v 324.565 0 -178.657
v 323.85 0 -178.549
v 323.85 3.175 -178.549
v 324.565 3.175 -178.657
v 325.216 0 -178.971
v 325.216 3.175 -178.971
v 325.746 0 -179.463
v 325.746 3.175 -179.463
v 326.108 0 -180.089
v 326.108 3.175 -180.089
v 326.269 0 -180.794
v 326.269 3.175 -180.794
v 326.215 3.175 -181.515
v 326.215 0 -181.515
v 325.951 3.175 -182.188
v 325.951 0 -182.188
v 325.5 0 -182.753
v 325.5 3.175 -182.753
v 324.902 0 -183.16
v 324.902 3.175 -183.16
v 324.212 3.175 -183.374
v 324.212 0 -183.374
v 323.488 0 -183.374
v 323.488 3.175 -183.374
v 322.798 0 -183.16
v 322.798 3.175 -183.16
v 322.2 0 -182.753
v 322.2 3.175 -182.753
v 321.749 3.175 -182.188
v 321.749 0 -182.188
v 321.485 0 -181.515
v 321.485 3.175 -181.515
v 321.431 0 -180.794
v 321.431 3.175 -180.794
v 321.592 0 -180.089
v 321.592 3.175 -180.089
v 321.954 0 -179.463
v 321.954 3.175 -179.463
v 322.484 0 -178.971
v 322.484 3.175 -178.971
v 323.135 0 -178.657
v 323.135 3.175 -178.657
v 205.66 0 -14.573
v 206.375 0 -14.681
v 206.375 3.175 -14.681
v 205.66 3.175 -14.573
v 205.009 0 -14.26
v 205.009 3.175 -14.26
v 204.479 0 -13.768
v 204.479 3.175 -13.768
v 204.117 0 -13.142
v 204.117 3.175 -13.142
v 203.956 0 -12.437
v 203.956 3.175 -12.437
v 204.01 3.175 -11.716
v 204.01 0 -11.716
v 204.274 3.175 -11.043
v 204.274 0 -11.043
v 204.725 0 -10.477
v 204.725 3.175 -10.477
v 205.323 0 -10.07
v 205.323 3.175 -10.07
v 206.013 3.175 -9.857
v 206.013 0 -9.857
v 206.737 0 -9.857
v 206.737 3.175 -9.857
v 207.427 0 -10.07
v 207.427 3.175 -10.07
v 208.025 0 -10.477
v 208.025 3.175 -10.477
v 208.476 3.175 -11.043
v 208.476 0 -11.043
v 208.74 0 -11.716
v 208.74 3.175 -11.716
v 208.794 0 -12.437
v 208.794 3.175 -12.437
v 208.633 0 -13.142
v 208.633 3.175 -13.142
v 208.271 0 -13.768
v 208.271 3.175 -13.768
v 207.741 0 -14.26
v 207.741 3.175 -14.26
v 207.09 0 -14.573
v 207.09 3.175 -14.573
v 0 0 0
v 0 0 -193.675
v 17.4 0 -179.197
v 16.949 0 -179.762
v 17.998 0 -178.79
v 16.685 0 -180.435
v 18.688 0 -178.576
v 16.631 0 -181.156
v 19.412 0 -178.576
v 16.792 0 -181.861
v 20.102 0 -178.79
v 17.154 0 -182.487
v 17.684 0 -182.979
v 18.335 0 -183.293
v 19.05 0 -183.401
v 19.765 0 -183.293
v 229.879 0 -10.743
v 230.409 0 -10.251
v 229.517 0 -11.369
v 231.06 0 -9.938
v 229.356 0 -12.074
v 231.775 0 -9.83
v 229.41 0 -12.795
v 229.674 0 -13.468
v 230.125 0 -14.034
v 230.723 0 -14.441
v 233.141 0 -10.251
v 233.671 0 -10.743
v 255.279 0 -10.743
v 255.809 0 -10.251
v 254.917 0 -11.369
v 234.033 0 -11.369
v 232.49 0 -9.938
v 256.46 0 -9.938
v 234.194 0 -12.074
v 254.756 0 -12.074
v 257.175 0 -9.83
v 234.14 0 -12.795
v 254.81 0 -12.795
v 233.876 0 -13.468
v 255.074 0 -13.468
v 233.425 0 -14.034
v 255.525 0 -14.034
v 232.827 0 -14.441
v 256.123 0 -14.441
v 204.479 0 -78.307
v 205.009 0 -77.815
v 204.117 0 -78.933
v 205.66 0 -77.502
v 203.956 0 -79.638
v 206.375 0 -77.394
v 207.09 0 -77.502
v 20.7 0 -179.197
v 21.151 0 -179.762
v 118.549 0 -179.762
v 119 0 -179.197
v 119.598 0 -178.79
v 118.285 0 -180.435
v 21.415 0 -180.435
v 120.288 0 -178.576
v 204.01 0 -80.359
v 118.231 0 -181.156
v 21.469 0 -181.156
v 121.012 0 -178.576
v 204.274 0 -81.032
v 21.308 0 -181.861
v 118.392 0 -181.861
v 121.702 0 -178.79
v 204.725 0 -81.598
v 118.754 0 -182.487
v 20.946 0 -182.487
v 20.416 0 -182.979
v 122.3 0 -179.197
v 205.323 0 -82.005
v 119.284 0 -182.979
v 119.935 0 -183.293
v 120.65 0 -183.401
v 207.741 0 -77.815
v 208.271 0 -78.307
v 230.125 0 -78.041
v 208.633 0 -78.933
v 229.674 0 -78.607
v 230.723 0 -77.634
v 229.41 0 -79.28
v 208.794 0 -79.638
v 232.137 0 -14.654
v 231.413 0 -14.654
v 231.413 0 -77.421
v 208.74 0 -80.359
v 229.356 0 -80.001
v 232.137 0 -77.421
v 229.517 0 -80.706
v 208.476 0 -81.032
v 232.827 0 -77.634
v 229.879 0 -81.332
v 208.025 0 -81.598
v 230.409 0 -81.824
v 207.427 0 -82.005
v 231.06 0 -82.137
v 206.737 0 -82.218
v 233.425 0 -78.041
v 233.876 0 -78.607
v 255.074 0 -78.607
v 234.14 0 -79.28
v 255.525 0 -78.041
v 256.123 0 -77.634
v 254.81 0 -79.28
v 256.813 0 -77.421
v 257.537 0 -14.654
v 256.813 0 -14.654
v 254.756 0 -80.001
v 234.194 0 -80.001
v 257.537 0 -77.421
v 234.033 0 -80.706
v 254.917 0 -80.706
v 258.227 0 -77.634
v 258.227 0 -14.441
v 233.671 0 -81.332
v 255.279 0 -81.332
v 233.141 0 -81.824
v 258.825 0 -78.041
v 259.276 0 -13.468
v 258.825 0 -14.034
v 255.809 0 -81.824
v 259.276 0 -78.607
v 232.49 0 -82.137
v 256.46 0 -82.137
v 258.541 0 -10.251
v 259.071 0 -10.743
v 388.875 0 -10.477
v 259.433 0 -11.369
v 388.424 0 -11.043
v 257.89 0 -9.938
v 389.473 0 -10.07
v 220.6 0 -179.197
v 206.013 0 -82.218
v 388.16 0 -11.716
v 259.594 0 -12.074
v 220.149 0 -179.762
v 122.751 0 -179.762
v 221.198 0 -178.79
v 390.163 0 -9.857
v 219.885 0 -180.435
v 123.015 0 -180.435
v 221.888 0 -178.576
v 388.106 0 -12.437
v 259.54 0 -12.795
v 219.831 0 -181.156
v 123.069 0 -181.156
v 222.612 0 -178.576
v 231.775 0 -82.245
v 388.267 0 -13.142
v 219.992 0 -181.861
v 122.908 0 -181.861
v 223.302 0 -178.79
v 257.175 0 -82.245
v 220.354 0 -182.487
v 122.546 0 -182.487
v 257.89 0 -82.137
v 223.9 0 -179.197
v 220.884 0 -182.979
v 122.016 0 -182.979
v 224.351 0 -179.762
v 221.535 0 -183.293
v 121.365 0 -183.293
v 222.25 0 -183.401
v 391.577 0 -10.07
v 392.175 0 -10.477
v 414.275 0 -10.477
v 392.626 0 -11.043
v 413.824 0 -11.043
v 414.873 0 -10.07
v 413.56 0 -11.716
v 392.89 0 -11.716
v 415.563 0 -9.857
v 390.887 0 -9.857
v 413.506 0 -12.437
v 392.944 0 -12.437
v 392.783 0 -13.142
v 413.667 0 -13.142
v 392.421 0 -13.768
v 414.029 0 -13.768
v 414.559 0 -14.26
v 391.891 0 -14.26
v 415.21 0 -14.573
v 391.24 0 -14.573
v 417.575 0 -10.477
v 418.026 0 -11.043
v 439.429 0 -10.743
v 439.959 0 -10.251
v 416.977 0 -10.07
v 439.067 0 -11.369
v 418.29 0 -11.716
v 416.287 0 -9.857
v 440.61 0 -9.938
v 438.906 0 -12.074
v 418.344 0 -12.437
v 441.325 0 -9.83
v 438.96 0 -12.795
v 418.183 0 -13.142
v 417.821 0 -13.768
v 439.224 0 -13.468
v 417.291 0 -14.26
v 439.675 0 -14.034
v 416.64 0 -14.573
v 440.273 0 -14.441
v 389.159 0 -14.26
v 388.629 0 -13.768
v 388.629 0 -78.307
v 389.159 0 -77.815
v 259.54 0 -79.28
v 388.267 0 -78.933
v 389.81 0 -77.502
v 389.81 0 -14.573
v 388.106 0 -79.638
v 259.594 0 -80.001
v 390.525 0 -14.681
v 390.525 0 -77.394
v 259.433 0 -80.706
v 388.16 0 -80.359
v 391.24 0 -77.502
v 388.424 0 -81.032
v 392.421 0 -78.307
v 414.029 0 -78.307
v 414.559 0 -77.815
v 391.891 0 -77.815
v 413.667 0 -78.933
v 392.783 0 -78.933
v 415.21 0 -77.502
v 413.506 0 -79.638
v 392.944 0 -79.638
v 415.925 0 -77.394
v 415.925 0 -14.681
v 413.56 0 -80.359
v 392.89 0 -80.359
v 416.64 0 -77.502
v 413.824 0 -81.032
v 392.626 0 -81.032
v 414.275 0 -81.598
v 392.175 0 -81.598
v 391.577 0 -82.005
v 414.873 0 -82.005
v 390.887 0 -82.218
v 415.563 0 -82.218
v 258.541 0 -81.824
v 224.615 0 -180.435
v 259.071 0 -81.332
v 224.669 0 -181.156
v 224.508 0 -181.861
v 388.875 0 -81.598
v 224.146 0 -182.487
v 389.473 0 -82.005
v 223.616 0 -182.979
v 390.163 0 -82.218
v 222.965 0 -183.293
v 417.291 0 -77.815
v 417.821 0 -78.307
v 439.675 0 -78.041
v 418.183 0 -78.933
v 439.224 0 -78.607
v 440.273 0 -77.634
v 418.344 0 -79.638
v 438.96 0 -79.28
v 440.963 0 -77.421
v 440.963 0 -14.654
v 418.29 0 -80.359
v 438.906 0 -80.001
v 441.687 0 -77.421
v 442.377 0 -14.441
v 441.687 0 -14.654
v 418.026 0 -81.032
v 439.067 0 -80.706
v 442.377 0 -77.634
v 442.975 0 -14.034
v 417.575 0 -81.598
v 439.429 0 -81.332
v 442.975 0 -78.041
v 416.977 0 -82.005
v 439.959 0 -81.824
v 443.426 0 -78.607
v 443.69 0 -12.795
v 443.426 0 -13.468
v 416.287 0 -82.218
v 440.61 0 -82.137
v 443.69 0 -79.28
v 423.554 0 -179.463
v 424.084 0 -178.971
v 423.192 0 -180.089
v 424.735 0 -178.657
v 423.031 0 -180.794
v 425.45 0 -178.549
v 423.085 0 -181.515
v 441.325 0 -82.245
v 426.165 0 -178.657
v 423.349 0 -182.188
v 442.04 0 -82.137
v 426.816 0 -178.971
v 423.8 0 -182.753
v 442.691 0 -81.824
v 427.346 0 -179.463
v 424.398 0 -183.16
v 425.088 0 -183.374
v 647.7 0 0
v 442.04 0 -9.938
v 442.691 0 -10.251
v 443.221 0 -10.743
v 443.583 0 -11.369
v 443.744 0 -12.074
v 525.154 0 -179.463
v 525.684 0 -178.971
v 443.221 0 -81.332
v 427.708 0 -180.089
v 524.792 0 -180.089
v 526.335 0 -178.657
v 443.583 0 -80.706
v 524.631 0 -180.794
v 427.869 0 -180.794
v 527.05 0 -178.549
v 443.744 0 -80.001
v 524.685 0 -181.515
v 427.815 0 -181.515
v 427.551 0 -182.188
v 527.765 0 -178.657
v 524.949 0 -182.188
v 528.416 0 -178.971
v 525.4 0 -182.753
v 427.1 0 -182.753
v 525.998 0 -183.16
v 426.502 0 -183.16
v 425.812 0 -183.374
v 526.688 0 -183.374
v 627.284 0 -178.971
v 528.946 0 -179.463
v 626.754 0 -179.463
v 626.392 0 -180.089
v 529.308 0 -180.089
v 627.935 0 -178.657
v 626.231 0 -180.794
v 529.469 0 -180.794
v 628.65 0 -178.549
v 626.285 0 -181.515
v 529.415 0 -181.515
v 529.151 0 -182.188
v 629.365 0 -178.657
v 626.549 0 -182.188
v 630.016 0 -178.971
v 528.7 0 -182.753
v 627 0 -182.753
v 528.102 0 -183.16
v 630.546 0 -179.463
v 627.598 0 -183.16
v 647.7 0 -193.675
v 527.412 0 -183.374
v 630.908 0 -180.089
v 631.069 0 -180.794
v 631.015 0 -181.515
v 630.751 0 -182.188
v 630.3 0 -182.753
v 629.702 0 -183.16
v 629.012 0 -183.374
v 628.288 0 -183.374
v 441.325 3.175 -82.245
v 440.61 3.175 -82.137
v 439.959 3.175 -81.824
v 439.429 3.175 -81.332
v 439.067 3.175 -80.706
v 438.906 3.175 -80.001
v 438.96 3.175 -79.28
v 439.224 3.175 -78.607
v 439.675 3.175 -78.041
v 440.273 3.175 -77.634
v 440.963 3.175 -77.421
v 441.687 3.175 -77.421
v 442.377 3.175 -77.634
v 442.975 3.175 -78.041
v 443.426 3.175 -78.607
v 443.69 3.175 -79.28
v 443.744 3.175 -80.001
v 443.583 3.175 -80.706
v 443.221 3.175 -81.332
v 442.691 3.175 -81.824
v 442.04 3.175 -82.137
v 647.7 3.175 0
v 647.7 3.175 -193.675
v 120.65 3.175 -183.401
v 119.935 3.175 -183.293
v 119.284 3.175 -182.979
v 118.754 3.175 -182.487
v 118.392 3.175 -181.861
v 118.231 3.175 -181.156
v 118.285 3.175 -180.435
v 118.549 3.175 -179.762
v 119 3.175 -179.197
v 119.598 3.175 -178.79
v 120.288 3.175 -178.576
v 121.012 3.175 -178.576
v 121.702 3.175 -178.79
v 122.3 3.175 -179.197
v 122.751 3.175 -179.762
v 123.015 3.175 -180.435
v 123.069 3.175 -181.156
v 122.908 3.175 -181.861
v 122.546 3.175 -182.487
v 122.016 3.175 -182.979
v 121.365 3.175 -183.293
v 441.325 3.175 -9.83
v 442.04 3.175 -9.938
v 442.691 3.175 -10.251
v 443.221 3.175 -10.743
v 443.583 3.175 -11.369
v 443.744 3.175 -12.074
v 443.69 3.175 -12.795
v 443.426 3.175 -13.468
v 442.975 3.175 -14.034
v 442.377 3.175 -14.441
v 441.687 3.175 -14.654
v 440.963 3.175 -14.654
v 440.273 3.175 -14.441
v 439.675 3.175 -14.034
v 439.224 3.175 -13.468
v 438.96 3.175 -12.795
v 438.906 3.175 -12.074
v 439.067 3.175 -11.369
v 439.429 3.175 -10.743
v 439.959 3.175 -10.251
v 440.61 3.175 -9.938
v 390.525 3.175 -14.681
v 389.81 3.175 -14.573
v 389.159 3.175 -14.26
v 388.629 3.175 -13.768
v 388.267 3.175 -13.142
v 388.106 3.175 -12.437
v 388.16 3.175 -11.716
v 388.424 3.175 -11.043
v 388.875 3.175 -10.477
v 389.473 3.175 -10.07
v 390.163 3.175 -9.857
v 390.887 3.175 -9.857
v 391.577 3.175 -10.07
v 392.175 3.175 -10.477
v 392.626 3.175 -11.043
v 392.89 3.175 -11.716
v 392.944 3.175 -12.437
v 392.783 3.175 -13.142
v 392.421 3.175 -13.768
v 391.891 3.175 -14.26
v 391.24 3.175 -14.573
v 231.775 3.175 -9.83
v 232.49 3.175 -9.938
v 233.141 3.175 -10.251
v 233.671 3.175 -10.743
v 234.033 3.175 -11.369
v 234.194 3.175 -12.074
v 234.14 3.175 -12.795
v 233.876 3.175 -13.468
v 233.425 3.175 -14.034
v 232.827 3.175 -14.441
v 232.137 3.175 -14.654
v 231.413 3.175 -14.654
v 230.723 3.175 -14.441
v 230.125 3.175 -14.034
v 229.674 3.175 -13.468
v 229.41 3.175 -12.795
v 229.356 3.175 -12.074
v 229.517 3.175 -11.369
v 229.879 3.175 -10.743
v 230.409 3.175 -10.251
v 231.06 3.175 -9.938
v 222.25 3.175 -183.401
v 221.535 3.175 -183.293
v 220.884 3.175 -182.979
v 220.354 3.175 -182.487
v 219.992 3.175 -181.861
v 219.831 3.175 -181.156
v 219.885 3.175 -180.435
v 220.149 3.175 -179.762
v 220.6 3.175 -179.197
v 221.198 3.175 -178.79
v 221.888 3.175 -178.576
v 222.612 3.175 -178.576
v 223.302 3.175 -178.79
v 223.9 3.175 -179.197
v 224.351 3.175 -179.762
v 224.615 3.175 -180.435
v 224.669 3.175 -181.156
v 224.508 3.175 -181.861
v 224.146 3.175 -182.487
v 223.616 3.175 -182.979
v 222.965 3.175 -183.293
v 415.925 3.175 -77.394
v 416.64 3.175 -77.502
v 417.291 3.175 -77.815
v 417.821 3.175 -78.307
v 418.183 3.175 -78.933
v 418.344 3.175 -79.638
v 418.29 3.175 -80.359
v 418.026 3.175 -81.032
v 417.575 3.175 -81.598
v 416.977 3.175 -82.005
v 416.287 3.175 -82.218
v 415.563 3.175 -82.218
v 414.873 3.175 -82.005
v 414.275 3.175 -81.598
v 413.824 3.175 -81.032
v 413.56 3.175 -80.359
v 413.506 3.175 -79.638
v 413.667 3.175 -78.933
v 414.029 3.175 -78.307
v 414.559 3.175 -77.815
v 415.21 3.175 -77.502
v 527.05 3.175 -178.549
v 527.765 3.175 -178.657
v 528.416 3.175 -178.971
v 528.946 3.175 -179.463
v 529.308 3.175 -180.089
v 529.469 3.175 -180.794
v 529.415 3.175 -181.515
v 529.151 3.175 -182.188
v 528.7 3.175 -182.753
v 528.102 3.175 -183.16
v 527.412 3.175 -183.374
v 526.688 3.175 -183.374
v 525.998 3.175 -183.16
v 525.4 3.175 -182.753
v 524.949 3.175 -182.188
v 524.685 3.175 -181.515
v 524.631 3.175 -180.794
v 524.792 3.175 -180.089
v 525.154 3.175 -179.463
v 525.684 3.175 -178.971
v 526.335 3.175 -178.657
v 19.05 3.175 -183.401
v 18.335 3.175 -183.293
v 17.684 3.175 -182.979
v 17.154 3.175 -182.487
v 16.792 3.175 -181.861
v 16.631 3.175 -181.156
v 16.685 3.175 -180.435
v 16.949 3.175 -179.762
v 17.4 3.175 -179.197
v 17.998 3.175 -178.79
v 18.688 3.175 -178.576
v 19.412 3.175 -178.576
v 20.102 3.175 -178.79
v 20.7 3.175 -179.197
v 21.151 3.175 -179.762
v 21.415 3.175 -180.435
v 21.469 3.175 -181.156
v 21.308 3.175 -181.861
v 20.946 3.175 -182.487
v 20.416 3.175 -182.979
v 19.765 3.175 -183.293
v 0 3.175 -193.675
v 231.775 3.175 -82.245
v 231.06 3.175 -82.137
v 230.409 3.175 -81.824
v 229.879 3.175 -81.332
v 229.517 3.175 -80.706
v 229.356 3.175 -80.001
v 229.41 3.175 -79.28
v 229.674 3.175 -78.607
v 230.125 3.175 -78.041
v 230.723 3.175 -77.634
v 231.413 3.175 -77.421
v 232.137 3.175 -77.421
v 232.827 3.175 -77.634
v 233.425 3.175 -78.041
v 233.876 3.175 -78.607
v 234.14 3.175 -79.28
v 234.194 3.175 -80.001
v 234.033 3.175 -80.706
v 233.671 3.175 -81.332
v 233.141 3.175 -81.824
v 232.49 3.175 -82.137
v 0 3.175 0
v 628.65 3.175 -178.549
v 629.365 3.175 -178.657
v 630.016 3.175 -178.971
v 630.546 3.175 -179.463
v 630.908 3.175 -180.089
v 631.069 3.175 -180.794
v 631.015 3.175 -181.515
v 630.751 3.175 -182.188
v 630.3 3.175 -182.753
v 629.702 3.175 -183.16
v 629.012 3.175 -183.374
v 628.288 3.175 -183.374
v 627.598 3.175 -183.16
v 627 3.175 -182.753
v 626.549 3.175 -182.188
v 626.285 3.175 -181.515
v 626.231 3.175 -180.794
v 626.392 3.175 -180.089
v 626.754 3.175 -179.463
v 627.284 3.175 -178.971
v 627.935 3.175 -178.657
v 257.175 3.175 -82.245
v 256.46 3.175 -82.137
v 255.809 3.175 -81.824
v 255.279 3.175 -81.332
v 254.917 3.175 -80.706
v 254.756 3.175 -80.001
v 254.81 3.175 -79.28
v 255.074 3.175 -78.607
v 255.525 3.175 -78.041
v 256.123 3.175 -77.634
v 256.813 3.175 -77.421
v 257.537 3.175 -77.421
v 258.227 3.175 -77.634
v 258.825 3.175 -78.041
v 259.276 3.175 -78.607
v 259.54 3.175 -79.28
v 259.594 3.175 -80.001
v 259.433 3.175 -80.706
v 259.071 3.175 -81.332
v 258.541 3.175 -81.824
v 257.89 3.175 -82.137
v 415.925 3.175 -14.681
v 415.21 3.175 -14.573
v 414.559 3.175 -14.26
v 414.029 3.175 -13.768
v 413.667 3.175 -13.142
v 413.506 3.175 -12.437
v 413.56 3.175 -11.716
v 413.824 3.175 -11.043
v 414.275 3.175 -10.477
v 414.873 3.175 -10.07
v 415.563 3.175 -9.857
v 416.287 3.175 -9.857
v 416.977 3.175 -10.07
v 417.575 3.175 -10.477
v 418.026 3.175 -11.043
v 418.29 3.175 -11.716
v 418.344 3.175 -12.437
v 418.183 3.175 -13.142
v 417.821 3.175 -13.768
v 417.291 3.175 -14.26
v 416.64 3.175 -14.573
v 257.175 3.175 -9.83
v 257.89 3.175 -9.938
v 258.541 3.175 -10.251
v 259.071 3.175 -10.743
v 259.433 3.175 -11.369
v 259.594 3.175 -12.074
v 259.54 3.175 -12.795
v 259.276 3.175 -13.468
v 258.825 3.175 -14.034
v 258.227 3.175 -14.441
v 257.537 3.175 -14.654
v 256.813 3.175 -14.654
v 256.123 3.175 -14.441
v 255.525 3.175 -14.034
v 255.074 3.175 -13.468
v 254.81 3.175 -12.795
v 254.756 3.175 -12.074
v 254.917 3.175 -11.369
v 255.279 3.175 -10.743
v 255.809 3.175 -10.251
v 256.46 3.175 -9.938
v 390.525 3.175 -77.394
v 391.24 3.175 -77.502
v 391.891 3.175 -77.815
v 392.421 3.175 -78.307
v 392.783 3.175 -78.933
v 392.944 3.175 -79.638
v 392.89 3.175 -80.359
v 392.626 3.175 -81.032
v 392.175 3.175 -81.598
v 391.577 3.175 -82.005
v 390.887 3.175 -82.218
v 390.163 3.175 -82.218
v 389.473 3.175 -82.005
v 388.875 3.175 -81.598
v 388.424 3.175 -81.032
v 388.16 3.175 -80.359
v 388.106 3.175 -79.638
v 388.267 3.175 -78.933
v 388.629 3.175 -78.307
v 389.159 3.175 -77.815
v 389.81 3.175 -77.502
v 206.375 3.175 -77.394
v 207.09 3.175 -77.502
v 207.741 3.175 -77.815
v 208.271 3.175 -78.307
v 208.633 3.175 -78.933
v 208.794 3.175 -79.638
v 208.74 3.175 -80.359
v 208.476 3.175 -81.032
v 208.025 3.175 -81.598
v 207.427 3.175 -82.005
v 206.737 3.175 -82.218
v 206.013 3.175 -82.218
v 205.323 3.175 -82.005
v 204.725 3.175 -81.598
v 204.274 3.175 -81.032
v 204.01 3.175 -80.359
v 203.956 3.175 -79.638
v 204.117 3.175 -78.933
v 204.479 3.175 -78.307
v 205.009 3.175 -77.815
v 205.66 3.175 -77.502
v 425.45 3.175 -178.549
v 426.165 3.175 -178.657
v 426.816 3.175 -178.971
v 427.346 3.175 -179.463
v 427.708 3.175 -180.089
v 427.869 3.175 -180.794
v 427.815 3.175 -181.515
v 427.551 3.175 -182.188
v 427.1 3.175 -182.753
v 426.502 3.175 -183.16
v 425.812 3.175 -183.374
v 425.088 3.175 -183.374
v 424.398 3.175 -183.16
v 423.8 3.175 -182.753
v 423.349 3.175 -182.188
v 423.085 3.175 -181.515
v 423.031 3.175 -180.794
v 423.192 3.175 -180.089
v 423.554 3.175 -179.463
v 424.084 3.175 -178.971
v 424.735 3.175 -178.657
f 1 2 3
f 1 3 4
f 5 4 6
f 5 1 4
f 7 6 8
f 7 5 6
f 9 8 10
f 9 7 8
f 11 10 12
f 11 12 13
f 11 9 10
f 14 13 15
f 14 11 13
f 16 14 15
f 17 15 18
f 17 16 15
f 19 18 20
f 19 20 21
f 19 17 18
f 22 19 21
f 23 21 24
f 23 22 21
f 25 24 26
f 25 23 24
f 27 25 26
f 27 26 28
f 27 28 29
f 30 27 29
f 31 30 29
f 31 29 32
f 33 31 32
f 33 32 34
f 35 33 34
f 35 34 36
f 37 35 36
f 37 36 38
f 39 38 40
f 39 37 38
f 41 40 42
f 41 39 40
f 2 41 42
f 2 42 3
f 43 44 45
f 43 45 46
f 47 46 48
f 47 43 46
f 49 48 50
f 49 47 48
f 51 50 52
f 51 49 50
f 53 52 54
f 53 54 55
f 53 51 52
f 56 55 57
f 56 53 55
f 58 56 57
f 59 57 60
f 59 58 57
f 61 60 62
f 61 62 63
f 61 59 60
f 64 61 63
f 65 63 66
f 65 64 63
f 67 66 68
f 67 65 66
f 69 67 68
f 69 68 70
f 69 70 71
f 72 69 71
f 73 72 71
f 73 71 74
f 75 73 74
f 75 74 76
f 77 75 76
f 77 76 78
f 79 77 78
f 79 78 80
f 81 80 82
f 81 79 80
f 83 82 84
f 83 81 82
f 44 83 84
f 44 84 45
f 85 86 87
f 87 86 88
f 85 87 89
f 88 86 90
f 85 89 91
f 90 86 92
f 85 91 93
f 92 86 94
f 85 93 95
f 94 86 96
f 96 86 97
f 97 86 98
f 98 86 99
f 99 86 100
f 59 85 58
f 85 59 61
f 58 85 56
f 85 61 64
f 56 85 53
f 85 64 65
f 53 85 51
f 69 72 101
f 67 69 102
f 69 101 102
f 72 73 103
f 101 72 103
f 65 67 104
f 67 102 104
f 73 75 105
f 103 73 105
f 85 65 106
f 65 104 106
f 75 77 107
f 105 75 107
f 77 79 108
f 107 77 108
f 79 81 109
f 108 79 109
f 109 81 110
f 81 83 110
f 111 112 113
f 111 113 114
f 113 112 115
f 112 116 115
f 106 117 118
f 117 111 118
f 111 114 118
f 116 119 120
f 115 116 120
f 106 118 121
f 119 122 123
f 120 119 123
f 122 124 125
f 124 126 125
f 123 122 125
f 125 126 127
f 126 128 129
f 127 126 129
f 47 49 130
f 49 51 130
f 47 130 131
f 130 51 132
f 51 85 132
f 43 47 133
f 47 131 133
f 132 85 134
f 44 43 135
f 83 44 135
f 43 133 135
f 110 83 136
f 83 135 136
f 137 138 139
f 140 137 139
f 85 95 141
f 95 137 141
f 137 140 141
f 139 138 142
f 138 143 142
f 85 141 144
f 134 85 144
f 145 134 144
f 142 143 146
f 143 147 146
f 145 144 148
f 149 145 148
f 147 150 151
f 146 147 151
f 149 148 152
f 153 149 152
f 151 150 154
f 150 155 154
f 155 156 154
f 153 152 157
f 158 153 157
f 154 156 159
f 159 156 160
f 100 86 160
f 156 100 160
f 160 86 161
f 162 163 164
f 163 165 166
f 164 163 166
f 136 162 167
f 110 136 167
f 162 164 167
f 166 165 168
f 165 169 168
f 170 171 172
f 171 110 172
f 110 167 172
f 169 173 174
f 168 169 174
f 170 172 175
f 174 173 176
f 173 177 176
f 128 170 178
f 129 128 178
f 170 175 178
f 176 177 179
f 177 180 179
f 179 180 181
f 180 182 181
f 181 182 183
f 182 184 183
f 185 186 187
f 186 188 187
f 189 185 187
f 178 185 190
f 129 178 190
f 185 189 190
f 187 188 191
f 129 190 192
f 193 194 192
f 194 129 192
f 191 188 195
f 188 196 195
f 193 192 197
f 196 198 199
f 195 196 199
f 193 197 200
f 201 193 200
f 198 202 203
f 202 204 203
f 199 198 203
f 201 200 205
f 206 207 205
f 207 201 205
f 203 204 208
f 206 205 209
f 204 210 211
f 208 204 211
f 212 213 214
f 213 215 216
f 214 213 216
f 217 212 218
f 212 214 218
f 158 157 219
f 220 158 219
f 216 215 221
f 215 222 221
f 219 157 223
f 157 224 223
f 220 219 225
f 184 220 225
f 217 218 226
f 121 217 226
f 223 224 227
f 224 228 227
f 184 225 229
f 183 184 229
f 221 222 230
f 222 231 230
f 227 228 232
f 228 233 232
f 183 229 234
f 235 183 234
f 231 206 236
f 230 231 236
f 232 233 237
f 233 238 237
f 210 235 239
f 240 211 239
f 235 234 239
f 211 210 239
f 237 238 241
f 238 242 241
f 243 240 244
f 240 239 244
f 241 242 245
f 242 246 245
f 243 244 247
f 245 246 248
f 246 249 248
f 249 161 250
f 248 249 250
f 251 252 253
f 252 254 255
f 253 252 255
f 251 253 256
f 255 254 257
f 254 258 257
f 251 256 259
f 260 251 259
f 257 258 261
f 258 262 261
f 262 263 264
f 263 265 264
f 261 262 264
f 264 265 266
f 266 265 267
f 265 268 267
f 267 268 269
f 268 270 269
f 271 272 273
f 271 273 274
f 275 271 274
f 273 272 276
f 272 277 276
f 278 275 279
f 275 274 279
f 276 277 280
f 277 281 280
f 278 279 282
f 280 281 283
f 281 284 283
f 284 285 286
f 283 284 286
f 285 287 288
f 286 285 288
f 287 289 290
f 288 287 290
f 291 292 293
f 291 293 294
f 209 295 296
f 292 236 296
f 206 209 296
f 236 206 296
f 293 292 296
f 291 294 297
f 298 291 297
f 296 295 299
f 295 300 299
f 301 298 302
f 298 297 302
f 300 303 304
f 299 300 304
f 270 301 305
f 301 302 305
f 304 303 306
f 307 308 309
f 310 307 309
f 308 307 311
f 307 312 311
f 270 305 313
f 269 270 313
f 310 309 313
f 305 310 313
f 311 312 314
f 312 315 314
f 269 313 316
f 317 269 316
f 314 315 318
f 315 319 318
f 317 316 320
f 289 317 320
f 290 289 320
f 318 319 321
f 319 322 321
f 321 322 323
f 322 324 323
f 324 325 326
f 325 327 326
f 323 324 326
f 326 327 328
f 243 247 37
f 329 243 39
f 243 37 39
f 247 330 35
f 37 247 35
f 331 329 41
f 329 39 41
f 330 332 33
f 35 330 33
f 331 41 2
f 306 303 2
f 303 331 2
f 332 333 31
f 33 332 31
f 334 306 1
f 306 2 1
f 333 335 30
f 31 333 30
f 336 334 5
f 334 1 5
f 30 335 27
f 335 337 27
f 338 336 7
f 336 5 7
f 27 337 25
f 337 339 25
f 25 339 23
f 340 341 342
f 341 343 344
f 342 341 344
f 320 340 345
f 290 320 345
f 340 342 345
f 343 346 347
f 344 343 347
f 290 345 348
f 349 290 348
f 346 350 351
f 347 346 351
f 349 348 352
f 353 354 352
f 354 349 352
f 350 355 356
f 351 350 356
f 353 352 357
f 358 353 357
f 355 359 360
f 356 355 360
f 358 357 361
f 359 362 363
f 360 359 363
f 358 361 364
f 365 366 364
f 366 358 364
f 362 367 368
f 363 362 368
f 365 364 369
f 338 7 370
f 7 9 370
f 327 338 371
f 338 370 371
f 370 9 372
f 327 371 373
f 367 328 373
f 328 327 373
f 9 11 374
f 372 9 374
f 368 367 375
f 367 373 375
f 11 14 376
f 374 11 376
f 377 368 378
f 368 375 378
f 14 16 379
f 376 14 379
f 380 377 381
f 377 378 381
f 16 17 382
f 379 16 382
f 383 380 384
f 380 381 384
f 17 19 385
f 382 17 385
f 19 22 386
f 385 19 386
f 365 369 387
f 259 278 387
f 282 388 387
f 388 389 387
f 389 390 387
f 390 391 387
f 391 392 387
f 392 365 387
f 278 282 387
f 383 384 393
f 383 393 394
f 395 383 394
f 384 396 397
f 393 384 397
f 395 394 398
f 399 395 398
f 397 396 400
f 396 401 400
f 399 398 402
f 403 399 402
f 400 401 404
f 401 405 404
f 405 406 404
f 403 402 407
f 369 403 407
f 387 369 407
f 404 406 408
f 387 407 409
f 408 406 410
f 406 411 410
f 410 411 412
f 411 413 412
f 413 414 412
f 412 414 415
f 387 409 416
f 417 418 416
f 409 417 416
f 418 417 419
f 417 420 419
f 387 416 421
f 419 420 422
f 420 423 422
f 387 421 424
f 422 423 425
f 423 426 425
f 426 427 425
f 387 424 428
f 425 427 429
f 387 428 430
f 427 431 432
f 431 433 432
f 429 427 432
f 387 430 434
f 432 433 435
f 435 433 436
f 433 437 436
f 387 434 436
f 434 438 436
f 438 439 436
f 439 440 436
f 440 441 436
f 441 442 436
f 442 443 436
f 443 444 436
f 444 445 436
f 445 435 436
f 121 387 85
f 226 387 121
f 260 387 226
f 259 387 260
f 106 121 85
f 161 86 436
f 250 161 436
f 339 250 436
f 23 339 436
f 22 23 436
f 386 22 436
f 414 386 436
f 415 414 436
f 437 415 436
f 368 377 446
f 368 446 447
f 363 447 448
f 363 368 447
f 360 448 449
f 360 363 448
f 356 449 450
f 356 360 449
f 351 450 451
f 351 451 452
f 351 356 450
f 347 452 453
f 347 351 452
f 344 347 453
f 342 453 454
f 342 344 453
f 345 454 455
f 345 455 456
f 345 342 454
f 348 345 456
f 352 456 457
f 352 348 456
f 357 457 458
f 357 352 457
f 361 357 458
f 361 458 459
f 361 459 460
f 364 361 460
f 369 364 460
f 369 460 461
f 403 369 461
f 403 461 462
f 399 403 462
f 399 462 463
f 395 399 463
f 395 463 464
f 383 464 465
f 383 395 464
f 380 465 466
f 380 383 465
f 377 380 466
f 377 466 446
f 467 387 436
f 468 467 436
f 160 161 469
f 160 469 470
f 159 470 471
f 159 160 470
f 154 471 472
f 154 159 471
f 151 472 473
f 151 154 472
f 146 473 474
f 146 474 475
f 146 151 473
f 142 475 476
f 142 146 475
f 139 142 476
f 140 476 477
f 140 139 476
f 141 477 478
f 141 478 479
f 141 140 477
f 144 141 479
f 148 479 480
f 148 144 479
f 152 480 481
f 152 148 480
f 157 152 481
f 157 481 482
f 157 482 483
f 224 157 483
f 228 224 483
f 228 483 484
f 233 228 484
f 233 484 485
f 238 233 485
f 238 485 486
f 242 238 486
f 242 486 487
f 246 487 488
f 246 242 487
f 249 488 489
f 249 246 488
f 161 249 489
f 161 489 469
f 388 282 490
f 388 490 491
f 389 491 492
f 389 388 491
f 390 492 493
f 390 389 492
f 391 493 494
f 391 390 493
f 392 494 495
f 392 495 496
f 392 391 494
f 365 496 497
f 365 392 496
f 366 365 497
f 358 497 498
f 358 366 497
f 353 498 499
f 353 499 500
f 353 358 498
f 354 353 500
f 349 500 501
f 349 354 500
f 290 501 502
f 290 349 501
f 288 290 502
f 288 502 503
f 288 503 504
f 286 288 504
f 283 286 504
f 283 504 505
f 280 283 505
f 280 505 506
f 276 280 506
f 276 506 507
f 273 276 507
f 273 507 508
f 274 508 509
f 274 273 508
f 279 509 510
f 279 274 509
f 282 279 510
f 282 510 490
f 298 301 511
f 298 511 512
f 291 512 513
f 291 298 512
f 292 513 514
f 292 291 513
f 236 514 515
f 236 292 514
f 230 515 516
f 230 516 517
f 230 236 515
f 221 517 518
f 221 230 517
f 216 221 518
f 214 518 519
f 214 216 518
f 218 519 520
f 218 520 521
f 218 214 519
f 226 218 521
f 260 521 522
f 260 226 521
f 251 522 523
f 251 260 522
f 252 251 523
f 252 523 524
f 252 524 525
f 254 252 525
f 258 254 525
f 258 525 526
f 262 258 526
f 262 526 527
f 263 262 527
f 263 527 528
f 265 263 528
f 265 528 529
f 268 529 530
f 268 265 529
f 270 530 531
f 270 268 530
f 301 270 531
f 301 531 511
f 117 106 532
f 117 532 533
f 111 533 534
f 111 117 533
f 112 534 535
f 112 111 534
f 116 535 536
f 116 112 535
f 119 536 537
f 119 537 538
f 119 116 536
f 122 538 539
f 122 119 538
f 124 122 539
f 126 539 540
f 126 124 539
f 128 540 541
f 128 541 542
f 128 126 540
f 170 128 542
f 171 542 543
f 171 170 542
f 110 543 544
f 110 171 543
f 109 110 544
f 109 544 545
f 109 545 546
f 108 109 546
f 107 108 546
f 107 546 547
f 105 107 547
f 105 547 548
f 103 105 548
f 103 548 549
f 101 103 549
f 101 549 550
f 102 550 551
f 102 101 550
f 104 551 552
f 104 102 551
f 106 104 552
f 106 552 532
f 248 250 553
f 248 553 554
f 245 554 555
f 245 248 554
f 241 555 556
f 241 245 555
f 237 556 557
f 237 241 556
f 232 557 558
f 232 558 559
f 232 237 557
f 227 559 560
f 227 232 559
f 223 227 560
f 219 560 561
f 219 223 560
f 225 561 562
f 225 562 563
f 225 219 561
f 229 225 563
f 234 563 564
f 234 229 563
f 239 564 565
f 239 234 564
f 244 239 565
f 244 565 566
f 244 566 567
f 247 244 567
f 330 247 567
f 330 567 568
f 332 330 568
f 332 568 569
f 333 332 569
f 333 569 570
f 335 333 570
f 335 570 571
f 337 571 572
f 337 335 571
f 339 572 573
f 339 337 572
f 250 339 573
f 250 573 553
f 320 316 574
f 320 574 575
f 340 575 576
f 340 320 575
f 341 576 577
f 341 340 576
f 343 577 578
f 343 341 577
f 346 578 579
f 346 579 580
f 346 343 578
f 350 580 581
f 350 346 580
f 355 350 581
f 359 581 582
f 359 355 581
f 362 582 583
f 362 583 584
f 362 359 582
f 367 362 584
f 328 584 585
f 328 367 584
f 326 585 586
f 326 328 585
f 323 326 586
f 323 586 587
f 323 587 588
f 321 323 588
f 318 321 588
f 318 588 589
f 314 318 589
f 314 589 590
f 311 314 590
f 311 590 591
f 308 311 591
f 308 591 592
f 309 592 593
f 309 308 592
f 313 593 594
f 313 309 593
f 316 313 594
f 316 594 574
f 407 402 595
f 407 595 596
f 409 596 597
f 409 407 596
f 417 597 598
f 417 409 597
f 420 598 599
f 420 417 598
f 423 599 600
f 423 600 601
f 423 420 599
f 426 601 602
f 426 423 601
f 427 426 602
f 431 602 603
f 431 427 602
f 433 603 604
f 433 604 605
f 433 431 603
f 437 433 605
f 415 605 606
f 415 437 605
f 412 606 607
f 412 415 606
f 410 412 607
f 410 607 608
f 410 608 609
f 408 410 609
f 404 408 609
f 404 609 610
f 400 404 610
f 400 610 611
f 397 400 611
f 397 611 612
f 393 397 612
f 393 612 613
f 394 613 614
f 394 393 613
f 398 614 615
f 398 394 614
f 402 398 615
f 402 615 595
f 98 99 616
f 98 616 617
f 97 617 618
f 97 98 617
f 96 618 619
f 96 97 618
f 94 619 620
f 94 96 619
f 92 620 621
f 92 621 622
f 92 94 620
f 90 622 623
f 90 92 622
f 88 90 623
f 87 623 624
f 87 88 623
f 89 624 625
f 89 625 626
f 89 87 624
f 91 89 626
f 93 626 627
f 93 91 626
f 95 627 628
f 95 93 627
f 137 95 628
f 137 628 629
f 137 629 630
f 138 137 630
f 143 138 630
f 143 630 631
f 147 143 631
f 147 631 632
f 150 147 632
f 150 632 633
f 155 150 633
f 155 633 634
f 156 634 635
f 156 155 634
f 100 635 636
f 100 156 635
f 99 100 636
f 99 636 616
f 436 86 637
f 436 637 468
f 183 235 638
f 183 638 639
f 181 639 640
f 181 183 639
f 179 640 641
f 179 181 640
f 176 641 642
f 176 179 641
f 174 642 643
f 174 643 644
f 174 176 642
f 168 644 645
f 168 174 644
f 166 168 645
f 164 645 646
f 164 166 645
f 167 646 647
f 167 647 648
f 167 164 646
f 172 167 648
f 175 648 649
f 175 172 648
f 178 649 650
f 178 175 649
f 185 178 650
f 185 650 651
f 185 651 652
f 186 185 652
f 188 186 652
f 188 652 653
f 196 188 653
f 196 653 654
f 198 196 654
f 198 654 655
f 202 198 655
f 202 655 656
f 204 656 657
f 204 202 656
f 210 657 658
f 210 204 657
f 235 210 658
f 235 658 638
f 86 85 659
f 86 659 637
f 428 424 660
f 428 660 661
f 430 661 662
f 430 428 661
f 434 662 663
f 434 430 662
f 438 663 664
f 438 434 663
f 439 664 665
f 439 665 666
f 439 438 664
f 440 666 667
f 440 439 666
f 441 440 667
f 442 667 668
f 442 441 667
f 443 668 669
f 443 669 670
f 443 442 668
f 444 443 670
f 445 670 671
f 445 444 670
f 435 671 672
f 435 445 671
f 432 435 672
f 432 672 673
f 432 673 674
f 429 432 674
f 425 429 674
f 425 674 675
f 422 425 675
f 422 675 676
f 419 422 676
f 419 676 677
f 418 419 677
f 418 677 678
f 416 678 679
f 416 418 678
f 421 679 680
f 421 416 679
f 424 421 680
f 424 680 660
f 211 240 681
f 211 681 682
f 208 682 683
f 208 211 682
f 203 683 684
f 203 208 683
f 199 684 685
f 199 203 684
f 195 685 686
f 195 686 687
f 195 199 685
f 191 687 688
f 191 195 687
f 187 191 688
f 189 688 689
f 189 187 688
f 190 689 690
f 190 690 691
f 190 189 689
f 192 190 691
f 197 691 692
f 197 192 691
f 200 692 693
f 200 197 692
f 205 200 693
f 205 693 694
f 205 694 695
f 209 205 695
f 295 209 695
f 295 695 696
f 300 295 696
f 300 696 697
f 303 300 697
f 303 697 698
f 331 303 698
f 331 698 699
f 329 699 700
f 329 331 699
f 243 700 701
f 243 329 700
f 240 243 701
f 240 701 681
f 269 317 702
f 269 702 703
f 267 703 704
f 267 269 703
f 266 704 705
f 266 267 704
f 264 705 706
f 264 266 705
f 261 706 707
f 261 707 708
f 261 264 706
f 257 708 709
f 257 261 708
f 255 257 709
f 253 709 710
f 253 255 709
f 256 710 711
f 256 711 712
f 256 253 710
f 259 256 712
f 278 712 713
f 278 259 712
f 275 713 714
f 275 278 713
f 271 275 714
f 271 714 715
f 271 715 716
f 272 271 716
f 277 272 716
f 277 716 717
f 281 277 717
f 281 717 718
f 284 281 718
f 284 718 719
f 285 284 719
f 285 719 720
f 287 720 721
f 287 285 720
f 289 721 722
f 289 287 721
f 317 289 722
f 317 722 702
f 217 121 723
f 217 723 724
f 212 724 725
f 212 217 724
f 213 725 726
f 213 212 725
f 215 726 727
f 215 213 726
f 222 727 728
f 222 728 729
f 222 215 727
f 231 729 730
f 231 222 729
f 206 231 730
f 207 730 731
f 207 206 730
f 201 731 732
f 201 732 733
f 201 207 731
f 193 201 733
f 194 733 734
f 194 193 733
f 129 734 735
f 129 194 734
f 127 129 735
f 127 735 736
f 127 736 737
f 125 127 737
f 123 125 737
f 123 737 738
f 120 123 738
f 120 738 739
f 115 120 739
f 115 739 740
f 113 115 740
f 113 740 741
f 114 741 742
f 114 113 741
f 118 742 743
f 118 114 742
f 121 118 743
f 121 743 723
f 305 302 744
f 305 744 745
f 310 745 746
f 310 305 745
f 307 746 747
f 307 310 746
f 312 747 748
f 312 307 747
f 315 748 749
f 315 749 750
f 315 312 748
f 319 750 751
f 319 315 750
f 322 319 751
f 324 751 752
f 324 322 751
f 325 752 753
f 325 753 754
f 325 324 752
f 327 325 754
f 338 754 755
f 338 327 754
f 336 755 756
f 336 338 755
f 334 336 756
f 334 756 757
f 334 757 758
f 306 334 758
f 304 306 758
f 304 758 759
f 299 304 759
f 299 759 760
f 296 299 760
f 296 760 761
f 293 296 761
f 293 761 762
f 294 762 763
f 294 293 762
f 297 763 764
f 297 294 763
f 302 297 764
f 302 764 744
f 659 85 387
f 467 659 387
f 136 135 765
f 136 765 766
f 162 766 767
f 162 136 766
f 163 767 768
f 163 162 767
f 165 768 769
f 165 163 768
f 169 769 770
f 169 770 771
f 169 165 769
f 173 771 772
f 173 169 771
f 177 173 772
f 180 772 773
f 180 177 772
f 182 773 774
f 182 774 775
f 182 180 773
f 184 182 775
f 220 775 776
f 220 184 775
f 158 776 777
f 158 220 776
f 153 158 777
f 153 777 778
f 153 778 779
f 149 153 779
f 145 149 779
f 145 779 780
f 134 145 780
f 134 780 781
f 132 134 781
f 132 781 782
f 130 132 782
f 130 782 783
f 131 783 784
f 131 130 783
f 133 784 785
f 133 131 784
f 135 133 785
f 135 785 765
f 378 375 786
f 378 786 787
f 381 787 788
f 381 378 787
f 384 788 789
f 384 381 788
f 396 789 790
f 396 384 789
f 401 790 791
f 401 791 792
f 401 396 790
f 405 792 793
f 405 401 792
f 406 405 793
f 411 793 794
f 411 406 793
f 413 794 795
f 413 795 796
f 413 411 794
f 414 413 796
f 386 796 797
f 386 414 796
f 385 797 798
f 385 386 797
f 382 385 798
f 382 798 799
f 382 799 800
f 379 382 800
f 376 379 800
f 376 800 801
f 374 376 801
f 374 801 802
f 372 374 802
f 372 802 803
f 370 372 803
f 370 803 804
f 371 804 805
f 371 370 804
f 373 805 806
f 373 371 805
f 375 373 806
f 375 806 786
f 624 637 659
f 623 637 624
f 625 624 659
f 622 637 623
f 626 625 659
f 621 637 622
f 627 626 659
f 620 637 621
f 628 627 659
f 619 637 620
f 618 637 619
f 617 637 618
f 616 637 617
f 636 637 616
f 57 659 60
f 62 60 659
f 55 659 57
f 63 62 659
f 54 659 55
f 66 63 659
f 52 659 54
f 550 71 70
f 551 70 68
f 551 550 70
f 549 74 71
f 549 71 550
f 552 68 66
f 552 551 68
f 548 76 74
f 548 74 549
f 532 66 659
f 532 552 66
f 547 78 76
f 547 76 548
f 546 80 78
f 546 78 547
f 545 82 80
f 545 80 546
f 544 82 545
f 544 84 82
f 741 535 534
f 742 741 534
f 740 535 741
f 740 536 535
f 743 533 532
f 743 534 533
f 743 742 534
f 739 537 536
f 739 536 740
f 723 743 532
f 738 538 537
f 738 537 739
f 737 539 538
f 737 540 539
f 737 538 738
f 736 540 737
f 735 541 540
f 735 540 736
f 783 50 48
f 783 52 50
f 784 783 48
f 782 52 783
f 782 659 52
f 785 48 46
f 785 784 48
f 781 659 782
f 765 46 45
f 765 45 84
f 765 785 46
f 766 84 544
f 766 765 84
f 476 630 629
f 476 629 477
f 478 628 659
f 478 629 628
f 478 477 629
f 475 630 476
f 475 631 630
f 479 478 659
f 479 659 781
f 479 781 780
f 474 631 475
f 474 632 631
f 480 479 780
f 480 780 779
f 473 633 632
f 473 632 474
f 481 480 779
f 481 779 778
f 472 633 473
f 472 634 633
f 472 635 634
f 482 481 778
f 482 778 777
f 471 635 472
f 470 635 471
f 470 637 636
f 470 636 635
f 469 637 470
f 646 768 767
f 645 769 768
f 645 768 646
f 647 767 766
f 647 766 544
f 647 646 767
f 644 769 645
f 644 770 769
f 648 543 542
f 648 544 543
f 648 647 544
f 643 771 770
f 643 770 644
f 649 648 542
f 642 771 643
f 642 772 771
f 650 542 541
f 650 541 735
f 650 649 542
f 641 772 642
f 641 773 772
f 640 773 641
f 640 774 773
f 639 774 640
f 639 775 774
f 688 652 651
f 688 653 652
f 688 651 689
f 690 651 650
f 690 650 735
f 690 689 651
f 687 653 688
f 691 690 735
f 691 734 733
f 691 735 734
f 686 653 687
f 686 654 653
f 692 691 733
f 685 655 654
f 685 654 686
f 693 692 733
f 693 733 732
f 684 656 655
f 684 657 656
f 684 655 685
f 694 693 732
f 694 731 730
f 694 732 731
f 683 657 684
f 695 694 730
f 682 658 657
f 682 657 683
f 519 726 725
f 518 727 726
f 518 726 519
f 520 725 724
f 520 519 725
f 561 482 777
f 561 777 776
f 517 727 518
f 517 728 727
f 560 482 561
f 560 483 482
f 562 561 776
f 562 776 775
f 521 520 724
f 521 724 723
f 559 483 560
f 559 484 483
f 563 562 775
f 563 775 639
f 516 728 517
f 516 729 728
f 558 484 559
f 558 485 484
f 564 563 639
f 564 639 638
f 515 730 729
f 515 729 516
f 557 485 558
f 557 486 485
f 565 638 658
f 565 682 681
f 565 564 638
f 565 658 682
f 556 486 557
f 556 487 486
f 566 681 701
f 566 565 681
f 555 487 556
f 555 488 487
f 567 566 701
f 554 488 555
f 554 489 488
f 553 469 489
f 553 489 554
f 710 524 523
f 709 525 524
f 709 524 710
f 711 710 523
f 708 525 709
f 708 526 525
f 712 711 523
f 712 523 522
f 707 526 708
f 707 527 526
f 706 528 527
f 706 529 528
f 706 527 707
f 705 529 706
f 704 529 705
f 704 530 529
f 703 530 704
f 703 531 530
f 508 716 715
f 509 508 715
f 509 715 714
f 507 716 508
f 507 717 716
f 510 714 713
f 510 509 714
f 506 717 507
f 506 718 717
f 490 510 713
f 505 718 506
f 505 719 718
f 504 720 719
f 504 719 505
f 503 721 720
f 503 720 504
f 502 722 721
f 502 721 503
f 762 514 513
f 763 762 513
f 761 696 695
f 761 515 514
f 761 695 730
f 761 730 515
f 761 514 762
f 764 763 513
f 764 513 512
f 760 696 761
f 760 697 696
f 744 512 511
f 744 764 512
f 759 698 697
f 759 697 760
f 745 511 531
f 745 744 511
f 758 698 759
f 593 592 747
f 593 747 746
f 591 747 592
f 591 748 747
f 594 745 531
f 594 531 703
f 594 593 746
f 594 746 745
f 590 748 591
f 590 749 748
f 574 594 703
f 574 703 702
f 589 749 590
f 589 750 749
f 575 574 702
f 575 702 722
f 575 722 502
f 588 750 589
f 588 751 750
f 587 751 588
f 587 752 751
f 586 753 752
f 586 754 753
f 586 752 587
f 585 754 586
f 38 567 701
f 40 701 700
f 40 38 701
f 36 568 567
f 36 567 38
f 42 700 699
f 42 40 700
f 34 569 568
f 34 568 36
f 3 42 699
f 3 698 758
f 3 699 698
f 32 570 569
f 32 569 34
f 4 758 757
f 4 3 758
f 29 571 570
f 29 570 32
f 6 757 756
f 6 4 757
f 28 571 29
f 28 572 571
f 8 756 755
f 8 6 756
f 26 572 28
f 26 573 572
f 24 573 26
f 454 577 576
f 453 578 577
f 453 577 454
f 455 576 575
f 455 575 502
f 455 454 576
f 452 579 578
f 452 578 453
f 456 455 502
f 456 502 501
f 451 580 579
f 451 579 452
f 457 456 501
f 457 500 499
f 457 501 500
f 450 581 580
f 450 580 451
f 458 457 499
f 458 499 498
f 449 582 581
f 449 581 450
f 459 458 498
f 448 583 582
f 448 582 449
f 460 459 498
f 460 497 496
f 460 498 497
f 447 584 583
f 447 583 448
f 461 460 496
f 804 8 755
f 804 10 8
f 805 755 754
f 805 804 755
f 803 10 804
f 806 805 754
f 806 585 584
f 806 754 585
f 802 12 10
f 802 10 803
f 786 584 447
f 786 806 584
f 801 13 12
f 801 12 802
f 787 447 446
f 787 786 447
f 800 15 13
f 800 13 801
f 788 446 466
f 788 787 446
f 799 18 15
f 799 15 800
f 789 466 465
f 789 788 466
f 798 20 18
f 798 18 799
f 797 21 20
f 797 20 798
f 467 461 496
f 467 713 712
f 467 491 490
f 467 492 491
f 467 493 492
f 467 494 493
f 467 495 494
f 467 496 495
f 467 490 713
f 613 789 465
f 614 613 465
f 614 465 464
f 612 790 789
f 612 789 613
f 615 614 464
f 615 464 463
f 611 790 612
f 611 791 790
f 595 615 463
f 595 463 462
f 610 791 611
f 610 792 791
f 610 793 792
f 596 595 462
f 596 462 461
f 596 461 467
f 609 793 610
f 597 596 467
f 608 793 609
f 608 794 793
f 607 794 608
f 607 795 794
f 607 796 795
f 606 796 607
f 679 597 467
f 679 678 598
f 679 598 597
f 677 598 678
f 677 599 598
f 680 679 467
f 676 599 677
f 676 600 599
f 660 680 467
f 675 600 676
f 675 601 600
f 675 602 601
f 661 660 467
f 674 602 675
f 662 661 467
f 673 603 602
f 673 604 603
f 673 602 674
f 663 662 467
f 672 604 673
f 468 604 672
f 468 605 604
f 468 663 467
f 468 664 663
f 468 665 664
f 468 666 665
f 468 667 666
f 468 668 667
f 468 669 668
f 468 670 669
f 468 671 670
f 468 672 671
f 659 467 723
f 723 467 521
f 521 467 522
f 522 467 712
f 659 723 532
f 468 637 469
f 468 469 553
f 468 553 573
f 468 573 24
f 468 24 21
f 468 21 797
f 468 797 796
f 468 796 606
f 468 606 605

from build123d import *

# Parameters (mm, degrees)
SKETCH1_W           = 647.7
SKETCH1_H           = 193.675
SKETCH1_R           = 2.4257
BOSS_EXTRUDE1_DEPTH = 3.175


with BuildPart() as part:
    # Sketch1 → Boss-Extrude1 (new body)
    with BuildSketch(Plane(origin=(0, 0, 0), x_dir=(1, 0, 0), z_dir=(0, 1, 0))):
        with Locations((323.85, 96.8375)):
            Rectangle(SKETCH1_W, SKETCH1_H)
        with Locations(Location((231.775, 12.2555, 0), (0, 0, 270))):
            Circle(SKETCH1_R, mode=Mode.SUBTRACT)
        with Locations(Location((257.175, 12.2555, 0), (0, 0, 270))):
            Circle(SKETCH1_R, mode=Mode.SUBTRACT)
        with Locations(Location((206.375, 12.2555, 0), (0, 0, 90))):
            Circle(SKETCH1_R, mode=Mode.SUBTRACT)
        with Locations(Location((257.175, 79.8195, 0), (0, 0, 90))):
            Circle(SKETCH1_R, mode=Mode.SUBTRACT)
        with Locations(Location((231.775, 79.8195, 0), (0, 0, 90))):
            Circle(SKETCH1_R, mode=Mode.SUBTRACT)
        with Locations(Location((206.375, 79.8195, 0), (0, 0, 270))):
            Circle(SKETCH1_R, mode=Mode.SUBTRACT)
        with Locations(Location((323.85, 180.975, 0), (0, 0, 270))):
            Circle(SKETCH1_R, mode=Mode.SUBTRACT)
        with Locations(Location((425.45, 180.975, 0), (0, 0, 270))):
            Circle(SKETCH1_R, mode=Mode.SUBTRACT)
        with Locations(Location((527.05, 180.975, 0), (0, 0, 270))):
            Circle(SKETCH1_R, mode=Mode.SUBTRACT)
        with Locations(Location((120.65, 180.975, 0), (0, 0, 90))):
            Circle(SKETCH1_R, mode=Mode.SUBTRACT)
        with Locations(Location((222.25, 180.975, 0), (0, 0, 90))):
            Circle(SKETCH1_R, mode=Mode.SUBTRACT)
        with Locations(Location((628.65, 180.975, 0), (0, 0, 270))):
            Circle(SKETCH1_R, mode=Mode.SUBTRACT)
        with Locations(Location((19.05, 180.975, 0), (0, 0, 90))):
            Circle(SKETCH1_R, mode=Mode.SUBTRACT)
        with Locations(Location((441.325, 79.8195, 0), (0, 0, 90))):
            Circle(SKETCH1_R, mode=Mode.SUBTRACT)
        with Locations(Location((415.925, 79.8195, 0), (0, 0, 270))):
            Circle(SKETCH1_R, mode=Mode.SUBTRACT)
        with Locations(Location((390.525, 79.8195, 0), (0, 0, 270))):
            Circle(SKETCH1_R, mode=Mode.SUBTRACT)
        with Locations(Location((441.325, 12.2555, 0), (0, 0, 270))):
            Circle(SKETCH1_R, mode=Mode.SUBTRACT)
        with Locations(Location((390.525, 12.2555, 0), (0, 0, 90))):
            Circle(SKETCH1_R, mode=Mode.SUBTRACT)
        with Locations(Location((415.925, 12.2555, 0), (0, 0, 90))):
            Circle(SKETCH1_R, mode=Mode.SUBTRACT)
    extrude(amount=BOSS_EXTRUDE1_DEPTH)


solid = part.part
